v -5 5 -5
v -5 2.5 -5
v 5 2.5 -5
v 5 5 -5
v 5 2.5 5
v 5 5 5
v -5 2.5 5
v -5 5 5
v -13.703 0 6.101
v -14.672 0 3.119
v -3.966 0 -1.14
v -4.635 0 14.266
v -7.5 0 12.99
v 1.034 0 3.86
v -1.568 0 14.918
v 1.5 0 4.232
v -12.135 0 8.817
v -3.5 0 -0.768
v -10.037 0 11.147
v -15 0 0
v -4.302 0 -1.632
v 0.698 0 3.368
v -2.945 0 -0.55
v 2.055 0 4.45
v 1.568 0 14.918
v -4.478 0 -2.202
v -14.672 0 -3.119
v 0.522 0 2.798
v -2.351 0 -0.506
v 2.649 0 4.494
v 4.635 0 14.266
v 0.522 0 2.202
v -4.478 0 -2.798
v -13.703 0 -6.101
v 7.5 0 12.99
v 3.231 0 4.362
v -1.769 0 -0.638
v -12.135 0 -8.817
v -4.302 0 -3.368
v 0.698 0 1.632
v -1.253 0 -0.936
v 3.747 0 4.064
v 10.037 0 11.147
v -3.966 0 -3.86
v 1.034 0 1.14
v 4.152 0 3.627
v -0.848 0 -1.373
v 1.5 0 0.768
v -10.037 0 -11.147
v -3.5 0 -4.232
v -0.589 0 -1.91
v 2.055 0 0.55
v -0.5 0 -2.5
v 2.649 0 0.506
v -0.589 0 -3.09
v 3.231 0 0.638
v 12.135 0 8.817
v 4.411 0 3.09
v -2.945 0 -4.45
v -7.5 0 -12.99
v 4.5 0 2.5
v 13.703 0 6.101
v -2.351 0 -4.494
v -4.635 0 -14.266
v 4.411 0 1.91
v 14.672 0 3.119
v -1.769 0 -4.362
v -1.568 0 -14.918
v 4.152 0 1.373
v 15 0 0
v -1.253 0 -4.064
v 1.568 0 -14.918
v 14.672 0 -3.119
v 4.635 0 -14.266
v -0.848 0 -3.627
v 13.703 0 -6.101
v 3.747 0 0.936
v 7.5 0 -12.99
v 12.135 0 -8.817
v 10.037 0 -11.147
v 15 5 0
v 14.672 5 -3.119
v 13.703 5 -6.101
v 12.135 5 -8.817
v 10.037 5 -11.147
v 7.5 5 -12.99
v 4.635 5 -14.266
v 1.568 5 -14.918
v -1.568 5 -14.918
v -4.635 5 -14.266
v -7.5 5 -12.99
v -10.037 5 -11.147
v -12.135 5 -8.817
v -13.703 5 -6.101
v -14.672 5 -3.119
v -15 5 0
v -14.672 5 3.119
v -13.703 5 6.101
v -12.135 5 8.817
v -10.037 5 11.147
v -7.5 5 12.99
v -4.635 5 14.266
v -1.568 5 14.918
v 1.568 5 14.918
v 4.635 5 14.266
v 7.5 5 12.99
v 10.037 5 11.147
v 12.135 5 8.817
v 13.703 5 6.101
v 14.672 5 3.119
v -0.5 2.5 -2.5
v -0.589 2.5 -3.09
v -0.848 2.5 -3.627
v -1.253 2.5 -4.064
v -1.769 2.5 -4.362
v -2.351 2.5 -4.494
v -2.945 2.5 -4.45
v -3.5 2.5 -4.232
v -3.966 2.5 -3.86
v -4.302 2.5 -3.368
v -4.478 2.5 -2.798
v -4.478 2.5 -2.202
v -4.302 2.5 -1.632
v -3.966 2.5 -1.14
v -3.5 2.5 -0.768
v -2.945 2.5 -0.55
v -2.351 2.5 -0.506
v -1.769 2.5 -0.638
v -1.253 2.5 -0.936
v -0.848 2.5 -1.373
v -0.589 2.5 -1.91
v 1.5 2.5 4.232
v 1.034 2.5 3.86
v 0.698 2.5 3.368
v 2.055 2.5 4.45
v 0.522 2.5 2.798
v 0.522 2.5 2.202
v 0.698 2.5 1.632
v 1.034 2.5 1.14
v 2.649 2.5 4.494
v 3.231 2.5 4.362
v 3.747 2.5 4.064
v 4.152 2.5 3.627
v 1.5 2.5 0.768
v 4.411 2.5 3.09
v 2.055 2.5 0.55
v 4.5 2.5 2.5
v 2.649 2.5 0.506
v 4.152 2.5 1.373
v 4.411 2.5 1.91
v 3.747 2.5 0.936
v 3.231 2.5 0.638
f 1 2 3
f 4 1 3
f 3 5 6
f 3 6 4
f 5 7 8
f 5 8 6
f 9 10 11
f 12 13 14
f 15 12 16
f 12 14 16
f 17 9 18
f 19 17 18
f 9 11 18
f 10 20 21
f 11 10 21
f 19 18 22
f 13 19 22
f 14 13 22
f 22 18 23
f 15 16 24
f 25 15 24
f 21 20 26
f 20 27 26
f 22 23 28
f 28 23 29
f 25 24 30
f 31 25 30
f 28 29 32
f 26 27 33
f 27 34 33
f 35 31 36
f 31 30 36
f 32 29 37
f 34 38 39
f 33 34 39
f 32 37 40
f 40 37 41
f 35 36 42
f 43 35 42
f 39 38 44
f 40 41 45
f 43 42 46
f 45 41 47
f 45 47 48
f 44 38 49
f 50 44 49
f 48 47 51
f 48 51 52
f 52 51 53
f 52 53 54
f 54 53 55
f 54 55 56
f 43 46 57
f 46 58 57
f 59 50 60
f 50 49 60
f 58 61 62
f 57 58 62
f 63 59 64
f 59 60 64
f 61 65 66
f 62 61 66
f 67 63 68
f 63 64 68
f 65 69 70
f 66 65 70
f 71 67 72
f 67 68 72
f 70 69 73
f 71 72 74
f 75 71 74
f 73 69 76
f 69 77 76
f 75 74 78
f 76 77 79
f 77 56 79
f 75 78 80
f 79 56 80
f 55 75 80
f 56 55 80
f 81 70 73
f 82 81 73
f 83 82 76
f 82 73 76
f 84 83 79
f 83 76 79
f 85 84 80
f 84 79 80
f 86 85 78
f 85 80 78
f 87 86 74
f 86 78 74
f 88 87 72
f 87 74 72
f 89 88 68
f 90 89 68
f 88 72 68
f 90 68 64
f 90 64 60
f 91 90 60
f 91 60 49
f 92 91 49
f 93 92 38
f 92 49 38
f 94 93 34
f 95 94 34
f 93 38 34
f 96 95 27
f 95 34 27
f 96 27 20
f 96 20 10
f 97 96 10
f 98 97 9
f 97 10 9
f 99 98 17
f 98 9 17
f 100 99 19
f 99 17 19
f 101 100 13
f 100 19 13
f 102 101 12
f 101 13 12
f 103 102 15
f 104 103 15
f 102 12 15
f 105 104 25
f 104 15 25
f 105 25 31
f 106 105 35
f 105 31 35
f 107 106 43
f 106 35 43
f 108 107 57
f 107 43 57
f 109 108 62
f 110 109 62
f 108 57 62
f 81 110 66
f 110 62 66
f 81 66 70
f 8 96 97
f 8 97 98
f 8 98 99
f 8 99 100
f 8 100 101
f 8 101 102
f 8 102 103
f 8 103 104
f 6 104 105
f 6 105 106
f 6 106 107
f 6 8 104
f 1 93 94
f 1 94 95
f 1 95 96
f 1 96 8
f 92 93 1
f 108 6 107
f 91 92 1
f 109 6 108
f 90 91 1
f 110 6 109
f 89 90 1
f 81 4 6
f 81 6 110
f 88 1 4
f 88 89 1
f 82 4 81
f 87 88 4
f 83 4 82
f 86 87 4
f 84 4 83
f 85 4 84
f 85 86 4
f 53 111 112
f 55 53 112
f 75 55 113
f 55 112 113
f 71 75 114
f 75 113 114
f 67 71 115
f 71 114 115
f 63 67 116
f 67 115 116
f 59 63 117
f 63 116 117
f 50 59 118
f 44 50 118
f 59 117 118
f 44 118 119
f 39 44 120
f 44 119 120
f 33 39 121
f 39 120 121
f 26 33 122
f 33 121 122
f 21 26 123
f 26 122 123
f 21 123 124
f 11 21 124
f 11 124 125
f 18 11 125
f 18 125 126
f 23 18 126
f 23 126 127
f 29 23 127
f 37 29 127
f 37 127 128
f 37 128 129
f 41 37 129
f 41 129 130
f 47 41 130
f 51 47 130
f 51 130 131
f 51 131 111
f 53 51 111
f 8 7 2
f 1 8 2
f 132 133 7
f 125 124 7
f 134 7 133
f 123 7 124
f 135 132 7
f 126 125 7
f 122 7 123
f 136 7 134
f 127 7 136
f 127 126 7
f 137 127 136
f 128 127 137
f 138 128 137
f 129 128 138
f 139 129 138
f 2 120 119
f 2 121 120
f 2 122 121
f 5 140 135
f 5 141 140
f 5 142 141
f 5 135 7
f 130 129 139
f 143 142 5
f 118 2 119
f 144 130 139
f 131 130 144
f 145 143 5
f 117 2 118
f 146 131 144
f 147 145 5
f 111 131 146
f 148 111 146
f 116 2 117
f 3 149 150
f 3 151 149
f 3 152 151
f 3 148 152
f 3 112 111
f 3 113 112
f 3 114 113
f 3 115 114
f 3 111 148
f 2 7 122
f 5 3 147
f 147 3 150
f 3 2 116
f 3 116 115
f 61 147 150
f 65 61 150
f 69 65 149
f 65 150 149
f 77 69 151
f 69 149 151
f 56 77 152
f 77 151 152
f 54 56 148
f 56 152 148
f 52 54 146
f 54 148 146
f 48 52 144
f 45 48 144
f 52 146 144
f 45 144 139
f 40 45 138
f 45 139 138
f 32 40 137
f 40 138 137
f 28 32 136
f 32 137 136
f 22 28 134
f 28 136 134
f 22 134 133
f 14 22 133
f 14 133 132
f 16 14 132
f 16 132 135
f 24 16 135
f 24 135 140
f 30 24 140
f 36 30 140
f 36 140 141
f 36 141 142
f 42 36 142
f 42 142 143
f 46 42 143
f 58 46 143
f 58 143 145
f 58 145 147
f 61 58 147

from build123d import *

# Parameters (mm, degrees)
SKETCH1_R           = 15
SKETCH1_W           = 10
SKETCH1_H           = 10
BOSS_EXTRUDE1_DEPTH = 5
SKETCH2_W           = 10
SKETCH2_H           = 2.5
BOSS_EXTRUDE2_DEPTH = 10
SKETCH3_R           = 2
CUT_EXTRUDE1_DEPTH  = 10


with BuildPart() as part:
    # Sketch1 → Boss-Extrude1 (new body)
    with BuildSketch(Plane(origin=(0, 0, 0), x_dir=(1, 0, 0), z_dir=(0, 1, 0))):
        Circle(SKETCH1_R)
        Rectangle(SKETCH1_W, SKETCH1_H, mode=Mode.SUBTRACT)
    extrude(amount=BOSS_EXTRUDE1_DEPTH)

    # Sketch2 → Boss-Extrude2 (add)
    with BuildSketch(Plane.XY.offset(-5)):
        with Locations((0, 1.25)):
            Rectangle(SKETCH2_W, SKETCH2_H)
    extrude(amount=BOSS_EXTRUDE2_DEPTH)

    # Sketch3 → Cut-Extrude1 (cut)
    with BuildSketch(Plane(origin=(0, 2.5, 0), x_dir=(1, 0, 0), z_dir=(0, 1, 0))):
        with Locations((-2.5, 2.5)):
            Circle(SKETCH3_R)
        with Locations((2.5, -2.5)):
            Circle(SKETCH3_R)
    extrude(amount=-CUT_EXTRUDE1_DEPTH, mode=Mode.SUBTRACT)


solid = part.part
